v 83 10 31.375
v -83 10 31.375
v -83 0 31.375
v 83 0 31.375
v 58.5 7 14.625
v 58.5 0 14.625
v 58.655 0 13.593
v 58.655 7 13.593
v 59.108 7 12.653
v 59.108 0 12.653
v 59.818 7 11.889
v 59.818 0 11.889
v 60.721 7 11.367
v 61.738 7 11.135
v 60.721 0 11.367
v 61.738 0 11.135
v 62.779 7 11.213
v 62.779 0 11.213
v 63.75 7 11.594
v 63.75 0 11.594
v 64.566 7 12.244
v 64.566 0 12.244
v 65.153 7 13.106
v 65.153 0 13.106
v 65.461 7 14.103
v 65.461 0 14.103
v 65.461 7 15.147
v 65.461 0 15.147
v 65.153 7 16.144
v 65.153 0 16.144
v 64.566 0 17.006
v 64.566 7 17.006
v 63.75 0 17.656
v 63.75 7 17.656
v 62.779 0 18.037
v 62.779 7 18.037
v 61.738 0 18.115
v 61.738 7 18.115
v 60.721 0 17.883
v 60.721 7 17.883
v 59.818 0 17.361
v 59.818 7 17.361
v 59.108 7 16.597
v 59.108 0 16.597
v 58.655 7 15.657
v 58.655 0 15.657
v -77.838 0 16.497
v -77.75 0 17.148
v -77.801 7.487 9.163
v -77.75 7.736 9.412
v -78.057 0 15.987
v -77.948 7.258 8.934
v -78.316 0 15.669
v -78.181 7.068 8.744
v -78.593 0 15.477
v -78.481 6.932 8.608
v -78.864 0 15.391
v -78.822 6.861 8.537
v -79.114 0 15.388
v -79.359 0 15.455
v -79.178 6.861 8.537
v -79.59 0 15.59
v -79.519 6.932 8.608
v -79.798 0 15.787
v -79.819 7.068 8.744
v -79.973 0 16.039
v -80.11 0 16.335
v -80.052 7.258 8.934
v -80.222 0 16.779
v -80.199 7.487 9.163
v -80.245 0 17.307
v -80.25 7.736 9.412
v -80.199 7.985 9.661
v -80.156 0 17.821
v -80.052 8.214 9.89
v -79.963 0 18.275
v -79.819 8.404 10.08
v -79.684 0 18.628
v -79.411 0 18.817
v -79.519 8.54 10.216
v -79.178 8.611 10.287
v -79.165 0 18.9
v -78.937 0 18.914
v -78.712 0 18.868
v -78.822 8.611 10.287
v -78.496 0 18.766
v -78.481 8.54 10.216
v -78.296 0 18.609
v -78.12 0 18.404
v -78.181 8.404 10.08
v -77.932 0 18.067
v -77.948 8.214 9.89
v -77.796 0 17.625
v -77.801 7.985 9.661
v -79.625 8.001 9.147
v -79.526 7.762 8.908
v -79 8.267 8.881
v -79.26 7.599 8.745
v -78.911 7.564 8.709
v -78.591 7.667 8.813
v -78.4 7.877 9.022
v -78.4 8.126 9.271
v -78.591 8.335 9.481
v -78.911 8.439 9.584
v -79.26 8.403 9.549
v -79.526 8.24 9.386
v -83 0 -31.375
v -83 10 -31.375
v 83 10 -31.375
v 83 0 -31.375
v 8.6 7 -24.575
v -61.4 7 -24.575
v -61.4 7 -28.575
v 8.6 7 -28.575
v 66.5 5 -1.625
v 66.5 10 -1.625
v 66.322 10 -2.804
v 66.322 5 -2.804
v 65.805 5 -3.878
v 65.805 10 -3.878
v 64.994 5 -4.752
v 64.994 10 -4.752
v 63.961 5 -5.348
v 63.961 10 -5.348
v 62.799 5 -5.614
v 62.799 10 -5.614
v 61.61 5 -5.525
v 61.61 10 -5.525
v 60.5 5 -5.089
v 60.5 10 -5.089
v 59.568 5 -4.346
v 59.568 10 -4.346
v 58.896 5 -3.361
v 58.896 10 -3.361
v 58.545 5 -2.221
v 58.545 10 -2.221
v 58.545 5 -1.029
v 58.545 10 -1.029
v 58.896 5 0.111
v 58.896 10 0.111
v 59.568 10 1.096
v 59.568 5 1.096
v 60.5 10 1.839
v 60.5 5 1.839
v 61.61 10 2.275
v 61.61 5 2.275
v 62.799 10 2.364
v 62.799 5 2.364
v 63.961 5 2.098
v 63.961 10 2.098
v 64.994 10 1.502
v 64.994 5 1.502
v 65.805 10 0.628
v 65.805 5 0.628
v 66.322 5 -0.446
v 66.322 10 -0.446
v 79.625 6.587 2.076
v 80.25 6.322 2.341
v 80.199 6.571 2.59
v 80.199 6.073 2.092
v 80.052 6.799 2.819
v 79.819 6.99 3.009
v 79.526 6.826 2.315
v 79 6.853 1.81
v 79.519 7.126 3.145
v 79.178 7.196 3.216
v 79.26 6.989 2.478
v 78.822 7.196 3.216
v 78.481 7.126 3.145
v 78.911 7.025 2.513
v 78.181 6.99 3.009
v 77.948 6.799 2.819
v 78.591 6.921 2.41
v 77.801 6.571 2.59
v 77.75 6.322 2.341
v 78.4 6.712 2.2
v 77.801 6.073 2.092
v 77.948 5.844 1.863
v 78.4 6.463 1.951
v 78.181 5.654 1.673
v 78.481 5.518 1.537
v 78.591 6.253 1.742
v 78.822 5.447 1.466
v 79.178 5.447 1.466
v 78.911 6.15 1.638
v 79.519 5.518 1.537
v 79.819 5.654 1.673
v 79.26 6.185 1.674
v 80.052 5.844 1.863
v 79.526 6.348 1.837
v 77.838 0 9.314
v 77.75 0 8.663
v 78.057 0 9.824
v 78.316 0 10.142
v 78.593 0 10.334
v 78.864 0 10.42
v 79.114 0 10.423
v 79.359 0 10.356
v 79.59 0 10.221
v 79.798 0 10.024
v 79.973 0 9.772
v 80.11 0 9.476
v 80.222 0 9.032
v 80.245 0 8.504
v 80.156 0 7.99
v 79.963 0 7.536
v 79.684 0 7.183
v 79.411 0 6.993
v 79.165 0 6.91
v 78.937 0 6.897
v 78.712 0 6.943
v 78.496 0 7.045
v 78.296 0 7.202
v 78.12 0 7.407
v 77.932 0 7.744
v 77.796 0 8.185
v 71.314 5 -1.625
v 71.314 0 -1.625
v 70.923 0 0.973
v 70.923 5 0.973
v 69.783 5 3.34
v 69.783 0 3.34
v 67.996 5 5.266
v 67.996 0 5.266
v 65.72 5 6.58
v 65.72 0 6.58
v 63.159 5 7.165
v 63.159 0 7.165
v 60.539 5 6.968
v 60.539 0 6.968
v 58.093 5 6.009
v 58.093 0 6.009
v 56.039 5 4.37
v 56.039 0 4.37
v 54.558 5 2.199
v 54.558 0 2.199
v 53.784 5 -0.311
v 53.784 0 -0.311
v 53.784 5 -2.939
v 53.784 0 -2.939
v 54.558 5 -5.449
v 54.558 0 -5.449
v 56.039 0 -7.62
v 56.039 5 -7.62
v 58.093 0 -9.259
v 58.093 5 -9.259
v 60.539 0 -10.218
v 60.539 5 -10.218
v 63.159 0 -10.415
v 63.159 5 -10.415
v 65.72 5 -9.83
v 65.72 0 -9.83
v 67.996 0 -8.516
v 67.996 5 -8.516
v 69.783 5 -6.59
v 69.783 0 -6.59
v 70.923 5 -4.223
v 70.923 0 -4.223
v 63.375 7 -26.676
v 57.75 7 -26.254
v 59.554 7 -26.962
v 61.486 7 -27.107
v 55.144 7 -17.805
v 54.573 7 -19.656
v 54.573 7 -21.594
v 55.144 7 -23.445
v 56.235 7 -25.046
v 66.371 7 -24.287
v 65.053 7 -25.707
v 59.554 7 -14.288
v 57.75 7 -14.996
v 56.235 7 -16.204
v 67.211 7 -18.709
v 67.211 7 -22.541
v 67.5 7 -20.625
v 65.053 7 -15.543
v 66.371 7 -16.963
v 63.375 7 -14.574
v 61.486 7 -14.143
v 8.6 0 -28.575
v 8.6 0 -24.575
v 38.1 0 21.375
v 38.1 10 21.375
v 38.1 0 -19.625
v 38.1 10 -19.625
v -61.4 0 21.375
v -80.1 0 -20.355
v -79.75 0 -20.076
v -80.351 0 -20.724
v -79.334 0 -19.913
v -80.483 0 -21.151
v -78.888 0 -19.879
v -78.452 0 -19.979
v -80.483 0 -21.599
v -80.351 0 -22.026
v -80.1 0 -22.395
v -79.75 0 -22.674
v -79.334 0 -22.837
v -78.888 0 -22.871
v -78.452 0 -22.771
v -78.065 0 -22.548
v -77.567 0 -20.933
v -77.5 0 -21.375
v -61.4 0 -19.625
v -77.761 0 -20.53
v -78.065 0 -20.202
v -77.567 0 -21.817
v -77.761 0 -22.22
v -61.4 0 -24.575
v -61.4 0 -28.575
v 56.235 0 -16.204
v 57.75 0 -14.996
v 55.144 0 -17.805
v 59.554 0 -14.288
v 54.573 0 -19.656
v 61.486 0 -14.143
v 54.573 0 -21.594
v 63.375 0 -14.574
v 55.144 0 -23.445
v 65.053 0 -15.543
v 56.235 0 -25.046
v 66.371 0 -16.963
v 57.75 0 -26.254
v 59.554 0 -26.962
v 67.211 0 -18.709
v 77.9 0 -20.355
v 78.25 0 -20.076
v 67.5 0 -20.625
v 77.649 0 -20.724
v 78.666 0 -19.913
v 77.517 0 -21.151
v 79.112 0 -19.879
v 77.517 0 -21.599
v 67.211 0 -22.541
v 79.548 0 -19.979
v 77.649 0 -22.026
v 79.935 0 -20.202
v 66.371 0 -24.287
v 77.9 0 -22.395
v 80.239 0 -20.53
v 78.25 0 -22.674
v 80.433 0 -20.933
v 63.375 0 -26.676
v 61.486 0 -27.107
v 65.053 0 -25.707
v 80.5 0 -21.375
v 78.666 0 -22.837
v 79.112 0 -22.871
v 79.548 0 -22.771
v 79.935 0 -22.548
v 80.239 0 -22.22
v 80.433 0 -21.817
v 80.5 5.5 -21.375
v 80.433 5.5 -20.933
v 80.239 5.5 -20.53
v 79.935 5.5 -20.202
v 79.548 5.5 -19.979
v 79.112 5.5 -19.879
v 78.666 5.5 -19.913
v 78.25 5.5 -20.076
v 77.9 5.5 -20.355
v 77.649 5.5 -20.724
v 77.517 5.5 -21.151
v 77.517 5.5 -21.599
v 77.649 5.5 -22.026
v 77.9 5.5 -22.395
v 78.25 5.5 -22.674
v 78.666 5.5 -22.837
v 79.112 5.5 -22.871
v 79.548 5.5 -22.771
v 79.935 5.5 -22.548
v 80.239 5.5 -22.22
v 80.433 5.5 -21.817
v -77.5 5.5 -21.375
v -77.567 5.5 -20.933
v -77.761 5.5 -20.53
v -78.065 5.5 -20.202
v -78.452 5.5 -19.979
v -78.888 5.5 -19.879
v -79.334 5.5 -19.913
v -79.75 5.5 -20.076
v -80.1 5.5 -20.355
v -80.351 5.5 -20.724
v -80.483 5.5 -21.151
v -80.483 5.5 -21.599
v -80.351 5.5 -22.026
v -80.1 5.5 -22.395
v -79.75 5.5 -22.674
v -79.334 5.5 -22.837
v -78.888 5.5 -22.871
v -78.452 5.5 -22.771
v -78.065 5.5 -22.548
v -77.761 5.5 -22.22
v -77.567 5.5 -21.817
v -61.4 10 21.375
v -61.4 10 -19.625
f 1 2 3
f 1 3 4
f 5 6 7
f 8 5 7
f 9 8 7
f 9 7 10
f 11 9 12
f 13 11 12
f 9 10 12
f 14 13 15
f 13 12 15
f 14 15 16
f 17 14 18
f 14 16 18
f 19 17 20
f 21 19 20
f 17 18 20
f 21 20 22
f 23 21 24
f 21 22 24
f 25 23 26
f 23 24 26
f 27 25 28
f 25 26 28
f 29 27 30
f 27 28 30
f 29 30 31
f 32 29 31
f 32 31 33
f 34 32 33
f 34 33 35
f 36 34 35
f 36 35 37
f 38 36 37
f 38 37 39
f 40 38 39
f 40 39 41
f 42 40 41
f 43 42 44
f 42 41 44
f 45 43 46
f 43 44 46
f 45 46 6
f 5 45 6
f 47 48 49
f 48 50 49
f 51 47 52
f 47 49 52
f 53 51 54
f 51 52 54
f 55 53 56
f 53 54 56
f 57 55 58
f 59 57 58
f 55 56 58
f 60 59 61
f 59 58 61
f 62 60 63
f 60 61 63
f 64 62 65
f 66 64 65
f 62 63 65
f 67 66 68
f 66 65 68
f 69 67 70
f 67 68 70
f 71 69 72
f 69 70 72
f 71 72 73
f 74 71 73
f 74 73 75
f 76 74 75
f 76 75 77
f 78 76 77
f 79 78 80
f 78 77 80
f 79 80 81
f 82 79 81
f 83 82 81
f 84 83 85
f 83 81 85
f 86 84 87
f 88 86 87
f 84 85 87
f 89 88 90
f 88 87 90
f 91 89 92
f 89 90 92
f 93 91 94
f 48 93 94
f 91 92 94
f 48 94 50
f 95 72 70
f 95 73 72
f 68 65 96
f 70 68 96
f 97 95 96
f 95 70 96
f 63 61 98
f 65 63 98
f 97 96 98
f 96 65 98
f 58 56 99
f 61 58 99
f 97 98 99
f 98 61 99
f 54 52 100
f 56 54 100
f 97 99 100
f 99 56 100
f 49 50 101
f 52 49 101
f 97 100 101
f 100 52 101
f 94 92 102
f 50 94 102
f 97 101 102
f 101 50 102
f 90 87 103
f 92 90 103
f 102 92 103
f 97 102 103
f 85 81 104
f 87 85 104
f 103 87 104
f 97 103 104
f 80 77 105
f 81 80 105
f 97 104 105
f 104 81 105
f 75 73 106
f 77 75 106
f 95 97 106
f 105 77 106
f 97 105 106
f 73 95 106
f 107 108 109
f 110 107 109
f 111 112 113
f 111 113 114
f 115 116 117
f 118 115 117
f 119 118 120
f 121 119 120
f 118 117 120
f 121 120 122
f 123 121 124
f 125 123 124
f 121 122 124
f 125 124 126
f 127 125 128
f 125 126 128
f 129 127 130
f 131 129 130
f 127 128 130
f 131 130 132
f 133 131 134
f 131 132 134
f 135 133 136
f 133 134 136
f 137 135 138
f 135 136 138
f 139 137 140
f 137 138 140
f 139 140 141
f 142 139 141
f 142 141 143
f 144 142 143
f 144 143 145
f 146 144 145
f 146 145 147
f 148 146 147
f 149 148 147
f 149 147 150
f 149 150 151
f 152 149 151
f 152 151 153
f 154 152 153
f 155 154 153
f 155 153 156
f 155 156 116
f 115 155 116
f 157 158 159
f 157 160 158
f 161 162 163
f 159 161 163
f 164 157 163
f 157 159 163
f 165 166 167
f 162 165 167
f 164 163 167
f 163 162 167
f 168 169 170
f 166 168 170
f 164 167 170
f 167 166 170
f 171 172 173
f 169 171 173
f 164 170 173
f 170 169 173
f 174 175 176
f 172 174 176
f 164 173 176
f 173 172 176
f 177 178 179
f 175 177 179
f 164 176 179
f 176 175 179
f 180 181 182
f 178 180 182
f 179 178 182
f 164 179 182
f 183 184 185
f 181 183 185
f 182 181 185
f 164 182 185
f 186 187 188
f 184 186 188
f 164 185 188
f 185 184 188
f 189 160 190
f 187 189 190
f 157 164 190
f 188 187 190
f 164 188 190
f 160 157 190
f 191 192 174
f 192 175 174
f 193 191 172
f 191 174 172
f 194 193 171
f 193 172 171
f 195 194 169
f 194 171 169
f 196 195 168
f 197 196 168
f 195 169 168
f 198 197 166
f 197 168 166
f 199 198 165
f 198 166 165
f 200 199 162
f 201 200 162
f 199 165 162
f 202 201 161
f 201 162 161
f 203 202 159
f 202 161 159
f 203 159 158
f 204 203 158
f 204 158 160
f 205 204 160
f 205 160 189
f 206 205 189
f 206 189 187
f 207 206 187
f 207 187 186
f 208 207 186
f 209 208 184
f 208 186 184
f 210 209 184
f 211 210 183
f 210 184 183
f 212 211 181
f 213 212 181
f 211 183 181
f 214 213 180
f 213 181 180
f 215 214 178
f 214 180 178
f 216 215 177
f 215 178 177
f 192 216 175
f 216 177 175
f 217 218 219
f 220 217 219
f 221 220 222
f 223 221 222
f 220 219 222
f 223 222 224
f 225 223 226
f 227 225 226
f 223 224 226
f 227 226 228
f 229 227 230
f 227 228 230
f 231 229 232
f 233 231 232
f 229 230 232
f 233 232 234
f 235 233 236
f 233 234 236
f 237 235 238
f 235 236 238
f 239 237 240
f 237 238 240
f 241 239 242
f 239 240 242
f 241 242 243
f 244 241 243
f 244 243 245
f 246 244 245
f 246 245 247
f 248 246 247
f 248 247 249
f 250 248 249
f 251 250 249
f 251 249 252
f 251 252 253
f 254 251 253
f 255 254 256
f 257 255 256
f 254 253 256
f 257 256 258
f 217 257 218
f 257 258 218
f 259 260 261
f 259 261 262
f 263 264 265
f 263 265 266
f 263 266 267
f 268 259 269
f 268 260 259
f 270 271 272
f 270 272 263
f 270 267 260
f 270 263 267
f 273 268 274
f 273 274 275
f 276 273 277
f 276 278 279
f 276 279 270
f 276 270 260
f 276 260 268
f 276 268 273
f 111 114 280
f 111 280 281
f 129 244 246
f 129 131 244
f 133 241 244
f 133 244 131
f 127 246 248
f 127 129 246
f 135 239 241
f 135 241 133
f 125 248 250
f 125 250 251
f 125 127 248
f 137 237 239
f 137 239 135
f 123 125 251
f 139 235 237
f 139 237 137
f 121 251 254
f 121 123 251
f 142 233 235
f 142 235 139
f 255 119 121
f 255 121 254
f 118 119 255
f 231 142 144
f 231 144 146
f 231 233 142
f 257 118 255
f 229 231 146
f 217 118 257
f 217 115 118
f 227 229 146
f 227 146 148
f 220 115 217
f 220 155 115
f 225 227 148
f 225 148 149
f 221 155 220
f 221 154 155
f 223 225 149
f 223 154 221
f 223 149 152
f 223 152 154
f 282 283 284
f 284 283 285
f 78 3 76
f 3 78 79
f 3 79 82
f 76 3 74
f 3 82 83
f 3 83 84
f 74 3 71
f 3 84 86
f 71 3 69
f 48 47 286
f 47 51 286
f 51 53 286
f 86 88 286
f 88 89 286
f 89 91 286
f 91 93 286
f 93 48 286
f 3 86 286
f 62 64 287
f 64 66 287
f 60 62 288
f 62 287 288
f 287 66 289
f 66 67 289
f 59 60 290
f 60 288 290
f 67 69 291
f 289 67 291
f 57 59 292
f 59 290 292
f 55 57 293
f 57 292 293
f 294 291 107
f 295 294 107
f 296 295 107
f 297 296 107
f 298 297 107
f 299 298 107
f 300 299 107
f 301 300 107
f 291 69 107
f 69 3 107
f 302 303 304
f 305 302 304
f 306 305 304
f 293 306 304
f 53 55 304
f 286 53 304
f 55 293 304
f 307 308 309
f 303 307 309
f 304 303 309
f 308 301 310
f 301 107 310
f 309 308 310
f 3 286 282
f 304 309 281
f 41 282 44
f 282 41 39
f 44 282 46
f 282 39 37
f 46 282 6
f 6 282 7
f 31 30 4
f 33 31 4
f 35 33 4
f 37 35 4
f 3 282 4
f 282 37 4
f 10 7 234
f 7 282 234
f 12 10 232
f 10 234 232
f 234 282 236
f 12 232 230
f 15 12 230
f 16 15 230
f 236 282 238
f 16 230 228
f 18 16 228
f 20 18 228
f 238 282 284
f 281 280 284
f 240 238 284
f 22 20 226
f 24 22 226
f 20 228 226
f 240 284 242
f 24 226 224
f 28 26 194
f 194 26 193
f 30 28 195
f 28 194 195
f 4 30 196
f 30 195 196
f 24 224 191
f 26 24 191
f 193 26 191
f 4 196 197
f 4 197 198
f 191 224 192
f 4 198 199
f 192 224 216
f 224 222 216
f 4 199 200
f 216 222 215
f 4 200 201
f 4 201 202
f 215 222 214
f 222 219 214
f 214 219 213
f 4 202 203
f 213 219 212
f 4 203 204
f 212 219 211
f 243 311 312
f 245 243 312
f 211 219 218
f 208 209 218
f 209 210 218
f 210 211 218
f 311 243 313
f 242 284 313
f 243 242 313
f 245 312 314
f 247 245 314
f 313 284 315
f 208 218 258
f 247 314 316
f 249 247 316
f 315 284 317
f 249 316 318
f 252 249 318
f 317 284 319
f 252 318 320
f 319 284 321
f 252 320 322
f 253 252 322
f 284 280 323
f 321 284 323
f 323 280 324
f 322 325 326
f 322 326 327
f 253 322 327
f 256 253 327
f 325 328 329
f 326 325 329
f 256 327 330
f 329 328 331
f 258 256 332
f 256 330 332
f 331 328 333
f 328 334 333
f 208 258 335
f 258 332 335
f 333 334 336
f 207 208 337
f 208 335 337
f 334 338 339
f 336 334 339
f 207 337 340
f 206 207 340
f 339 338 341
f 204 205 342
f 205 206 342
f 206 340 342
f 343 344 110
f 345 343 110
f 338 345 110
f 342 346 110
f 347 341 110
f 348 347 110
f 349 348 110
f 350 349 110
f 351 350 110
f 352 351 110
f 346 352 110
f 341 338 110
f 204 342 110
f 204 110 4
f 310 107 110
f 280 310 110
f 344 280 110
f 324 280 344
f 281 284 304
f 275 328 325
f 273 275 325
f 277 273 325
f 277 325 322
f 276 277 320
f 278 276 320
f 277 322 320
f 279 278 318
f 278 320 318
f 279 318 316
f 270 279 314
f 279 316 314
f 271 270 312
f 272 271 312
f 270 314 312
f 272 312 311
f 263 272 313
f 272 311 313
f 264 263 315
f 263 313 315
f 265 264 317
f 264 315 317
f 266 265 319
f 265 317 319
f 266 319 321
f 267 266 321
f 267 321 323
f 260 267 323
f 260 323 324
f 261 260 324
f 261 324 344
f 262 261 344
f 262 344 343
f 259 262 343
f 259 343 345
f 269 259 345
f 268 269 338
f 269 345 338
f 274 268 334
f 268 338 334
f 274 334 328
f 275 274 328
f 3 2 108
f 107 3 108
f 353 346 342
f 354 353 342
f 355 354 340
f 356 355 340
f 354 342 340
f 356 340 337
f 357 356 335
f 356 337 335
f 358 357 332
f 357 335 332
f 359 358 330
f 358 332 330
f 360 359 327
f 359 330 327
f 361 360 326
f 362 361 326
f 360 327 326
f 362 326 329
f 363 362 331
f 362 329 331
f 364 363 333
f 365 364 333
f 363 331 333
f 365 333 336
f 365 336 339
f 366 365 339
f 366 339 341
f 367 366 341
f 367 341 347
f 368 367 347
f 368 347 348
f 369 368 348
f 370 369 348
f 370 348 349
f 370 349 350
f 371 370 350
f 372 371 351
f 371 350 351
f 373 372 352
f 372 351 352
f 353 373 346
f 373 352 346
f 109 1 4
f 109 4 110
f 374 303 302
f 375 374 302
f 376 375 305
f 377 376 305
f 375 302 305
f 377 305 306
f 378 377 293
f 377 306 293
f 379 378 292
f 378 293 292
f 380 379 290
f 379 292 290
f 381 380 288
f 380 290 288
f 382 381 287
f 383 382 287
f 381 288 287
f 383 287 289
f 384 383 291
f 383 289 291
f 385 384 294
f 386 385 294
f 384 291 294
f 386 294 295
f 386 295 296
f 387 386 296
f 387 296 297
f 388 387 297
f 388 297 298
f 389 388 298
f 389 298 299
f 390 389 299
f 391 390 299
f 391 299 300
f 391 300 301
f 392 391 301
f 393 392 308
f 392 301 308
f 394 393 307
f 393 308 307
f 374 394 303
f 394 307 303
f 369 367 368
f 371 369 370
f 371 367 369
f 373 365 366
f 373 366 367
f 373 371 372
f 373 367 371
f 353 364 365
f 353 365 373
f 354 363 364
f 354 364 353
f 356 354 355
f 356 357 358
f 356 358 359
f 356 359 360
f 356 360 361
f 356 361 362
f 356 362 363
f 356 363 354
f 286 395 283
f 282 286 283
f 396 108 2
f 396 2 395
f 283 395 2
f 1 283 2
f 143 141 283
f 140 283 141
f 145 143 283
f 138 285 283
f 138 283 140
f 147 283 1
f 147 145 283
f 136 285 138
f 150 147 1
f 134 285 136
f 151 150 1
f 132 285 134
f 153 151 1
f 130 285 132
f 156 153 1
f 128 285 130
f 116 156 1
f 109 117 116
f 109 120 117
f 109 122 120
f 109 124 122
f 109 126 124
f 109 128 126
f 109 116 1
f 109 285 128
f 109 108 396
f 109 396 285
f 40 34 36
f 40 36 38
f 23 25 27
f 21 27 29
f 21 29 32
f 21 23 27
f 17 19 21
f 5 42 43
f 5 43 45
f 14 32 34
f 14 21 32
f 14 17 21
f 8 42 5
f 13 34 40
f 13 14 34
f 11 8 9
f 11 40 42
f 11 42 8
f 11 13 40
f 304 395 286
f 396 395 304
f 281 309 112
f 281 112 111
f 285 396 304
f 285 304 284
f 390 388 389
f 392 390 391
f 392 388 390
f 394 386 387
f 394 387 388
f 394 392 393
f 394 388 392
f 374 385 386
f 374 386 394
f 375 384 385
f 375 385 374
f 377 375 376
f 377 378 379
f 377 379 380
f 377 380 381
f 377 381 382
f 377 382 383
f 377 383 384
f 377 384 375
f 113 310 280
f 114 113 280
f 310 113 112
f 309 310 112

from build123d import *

# Parameters (mm, degrees)
SKETCH2_W                 = 150
SKETCH2_H                 = 62.75
BOSS_EXTRUDE1_DEPTH       = 10
SKETCH3_W                 = 99.5
SKETCH3_H                 = 41
CUT_EXTRUDE1_DEPTH        = 11
SKETCH7_W                 = 70
SKETCH7_H                 = 4
CUT_EXTRUDE4_DEPTH        = 7
SKETCH8_R                 = 4
CUT_EXTRUDE5_DEPTH        = 11
SKETCH9_R                 = 6.5
CUT_EXTRUDE6_DEPTH        = 7
SKETCH10_R                = 3.5
CUT_EXTRUDE7_DEPTH        = 7
SKETCH11_W                = 8
SKETCH11_H                = 62.75
BOSS_EXTRUDE2_DEPTH       = 10
M3X0_5_TAPPED_HOLE2_D     = 2.5
M3X0_5_TAPPED_HOLE2_DEPTH = 25
M3X0_5_TAPPED_HOLE2_TIP   = 0.751075774
M3X0_5_TAPPED_HOLE3_D     = 2.5
M3X0_5_TAPPED_HOLE3_DEPTH = 21
M3X0_5_TAPPED_HOLE3_TIP   = 0.751075774
SKETCH28_R                = 1.5
CUT_EXTRUDE8_DEPTH        = 5.5
SKETCH29_R                = 8.814479729
CUT_EXTRUDE9_DEPTH        = 5


with BuildPart() as part:
    # Sketch2 → Boss-Extrude1 (new body)
    with BuildSketch(Plane(origin=(0, 0, 0), x_dir=(1, 0, 0), z_dir=(0, 1, 0))):
        Rectangle(SKETCH2_W, SKETCH2_H)
    extrude(amount=BOSS_EXTRUDE1_DEPTH)

    # Sketch3 → Cut-Extrude1 (cut, through all)
    with BuildSketch(Plane(origin=(0, 10, 0), x_dir=(1, 0, 0), z_dir=(0, 1, 0))):
        with Locations((-11.65, -0.875)):
            Rectangle(SKETCH3_W, SKETCH3_H)
    extrude(amount=-CUT_EXTRUDE1_DEPTH, mode=Mode.SUBTRACT)

    # Sketch7 → Cut-Extrude4 (cut)
    with BuildSketch(Plane.XZ):
        with Locations((-26.4, -26.575)):
            Rectangle(SKETCH7_W, SKETCH7_H)
    extrude(amount=-CUT_EXTRUDE4_DEPTH, mode=Mode.SUBTRACT)

    # Sketch8 → Cut-Extrude5 (cut, through all)
    with BuildSketch(Plane(origin=(0, 10, 0), x_dir=(1, 0, 0), z_dir=(0, 1, 0))):
        with Locations((62.5, 1.625)):
            Circle(SKETCH8_R)
    extrude(amount=-CUT_EXTRUDE5_DEPTH, mode=Mode.SUBTRACT)

    # Sketch9 → Cut-Extrude6 (cut)
    with BuildSketch(Plane.XZ):
        with Locations((61, -20.625)):
            Circle(SKETCH9_R)
    extrude(amount=-CUT_EXTRUDE6_DEPTH, mode=Mode.SUBTRACT)

    # Sketch10 → Cut-Extrude7 (cut)
    with BuildSketch(Plane(origin=(0, 0, 0), x_dir=(-1, 0, 0), z_dir=(0, -1, 0))):
        with Locations((-62, -14.625)):
            Circle(SKETCH10_R)
    extrude(amount=-CUT_EXTRUDE7_DEPTH, mode=Mode.SUBTRACT)

    # Sketch11 → Boss-Extrude2 (add, through all)
    with BuildSketch(Plane(origin=(0, 10, 0), x_dir=(1, 0, 0), z_dir=(0, 1, 0))):
        with Locations((-79, 0)):
            Rectangle(SKETCH11_W, SKETCH11_H)
        with Locations((79, 0)):
            Rectangle(SKETCH11_W, SKETCH11_H)
    extrude(amount=-BOSS_EXTRUDE2_DEPTH)

    # M3x0.5 Tapped Hole2
    with Locations(Plane(origin=(0, -15.6875, 15.6875), x_dir=(1, 0, 0), z_dir=(0, -0.707106781, 0.707106781))):
        with Locations((79, 6.12547526)):
            Hole(M3X0_5_TAPPED_HOLE2_D / 2, depth=M3X0_5_TAPPED_HOLE2_DEPTH)
            with Locations((0, 0, -(M3X0_5_TAPPED_HOLE2_DEPTH + M3X0_5_TAPPED_HOLE2_TIP / 2))):  # 118° drill point
                Cone(0, M3X0_5_TAPPED_HOLE2_D / 2, M3X0_5_TAPPED_HOLE2_TIP, mode=Mode.SUBTRACT)

    # M3x0.5 Tapped Hole3
    with Locations(Plane(origin=(0, -15.6875, 15.6875), x_dir=(-1, 0, 0), z_dir=(0, -0.707106781, 0.707106781))):
        with Locations((79, -12.12547526)):
            Hole(M3X0_5_TAPPED_HOLE3_D / 2, depth=M3X0_5_TAPPED_HOLE3_DEPTH)
            with Locations((0, 0, -(M3X0_5_TAPPED_HOLE3_DEPTH + M3X0_5_TAPPED_HOLE3_TIP / 2))):  # 118° drill point
                Cone(0, M3X0_5_TAPPED_HOLE3_D / 2, M3X0_5_TAPPED_HOLE3_TIP, mode=Mode.SUBTRACT)

    # Sketch28 → Cut-Extrude8 (cut)
    with BuildSketch(Plane.XZ):
        with Locations((79, -21.375)):
            Circle(SKETCH28_R)
        with Locations((-79, -21.375)):
            Circle(SKETCH28_R)
    extrude(amount=-CUT_EXTRUDE8_DEPTH, mode=Mode.SUBTRACT)

    # Sketch29 → Cut-Extrude9 (cut)
    with BuildSketch(Plane.XZ):
        with Locations((62.5, -1.625)):
            Circle(SKETCH29_R)
    extrude(amount=-CUT_EXTRUDE9_DEPTH, mode=Mode.SUBTRACT)


solid = part.part
